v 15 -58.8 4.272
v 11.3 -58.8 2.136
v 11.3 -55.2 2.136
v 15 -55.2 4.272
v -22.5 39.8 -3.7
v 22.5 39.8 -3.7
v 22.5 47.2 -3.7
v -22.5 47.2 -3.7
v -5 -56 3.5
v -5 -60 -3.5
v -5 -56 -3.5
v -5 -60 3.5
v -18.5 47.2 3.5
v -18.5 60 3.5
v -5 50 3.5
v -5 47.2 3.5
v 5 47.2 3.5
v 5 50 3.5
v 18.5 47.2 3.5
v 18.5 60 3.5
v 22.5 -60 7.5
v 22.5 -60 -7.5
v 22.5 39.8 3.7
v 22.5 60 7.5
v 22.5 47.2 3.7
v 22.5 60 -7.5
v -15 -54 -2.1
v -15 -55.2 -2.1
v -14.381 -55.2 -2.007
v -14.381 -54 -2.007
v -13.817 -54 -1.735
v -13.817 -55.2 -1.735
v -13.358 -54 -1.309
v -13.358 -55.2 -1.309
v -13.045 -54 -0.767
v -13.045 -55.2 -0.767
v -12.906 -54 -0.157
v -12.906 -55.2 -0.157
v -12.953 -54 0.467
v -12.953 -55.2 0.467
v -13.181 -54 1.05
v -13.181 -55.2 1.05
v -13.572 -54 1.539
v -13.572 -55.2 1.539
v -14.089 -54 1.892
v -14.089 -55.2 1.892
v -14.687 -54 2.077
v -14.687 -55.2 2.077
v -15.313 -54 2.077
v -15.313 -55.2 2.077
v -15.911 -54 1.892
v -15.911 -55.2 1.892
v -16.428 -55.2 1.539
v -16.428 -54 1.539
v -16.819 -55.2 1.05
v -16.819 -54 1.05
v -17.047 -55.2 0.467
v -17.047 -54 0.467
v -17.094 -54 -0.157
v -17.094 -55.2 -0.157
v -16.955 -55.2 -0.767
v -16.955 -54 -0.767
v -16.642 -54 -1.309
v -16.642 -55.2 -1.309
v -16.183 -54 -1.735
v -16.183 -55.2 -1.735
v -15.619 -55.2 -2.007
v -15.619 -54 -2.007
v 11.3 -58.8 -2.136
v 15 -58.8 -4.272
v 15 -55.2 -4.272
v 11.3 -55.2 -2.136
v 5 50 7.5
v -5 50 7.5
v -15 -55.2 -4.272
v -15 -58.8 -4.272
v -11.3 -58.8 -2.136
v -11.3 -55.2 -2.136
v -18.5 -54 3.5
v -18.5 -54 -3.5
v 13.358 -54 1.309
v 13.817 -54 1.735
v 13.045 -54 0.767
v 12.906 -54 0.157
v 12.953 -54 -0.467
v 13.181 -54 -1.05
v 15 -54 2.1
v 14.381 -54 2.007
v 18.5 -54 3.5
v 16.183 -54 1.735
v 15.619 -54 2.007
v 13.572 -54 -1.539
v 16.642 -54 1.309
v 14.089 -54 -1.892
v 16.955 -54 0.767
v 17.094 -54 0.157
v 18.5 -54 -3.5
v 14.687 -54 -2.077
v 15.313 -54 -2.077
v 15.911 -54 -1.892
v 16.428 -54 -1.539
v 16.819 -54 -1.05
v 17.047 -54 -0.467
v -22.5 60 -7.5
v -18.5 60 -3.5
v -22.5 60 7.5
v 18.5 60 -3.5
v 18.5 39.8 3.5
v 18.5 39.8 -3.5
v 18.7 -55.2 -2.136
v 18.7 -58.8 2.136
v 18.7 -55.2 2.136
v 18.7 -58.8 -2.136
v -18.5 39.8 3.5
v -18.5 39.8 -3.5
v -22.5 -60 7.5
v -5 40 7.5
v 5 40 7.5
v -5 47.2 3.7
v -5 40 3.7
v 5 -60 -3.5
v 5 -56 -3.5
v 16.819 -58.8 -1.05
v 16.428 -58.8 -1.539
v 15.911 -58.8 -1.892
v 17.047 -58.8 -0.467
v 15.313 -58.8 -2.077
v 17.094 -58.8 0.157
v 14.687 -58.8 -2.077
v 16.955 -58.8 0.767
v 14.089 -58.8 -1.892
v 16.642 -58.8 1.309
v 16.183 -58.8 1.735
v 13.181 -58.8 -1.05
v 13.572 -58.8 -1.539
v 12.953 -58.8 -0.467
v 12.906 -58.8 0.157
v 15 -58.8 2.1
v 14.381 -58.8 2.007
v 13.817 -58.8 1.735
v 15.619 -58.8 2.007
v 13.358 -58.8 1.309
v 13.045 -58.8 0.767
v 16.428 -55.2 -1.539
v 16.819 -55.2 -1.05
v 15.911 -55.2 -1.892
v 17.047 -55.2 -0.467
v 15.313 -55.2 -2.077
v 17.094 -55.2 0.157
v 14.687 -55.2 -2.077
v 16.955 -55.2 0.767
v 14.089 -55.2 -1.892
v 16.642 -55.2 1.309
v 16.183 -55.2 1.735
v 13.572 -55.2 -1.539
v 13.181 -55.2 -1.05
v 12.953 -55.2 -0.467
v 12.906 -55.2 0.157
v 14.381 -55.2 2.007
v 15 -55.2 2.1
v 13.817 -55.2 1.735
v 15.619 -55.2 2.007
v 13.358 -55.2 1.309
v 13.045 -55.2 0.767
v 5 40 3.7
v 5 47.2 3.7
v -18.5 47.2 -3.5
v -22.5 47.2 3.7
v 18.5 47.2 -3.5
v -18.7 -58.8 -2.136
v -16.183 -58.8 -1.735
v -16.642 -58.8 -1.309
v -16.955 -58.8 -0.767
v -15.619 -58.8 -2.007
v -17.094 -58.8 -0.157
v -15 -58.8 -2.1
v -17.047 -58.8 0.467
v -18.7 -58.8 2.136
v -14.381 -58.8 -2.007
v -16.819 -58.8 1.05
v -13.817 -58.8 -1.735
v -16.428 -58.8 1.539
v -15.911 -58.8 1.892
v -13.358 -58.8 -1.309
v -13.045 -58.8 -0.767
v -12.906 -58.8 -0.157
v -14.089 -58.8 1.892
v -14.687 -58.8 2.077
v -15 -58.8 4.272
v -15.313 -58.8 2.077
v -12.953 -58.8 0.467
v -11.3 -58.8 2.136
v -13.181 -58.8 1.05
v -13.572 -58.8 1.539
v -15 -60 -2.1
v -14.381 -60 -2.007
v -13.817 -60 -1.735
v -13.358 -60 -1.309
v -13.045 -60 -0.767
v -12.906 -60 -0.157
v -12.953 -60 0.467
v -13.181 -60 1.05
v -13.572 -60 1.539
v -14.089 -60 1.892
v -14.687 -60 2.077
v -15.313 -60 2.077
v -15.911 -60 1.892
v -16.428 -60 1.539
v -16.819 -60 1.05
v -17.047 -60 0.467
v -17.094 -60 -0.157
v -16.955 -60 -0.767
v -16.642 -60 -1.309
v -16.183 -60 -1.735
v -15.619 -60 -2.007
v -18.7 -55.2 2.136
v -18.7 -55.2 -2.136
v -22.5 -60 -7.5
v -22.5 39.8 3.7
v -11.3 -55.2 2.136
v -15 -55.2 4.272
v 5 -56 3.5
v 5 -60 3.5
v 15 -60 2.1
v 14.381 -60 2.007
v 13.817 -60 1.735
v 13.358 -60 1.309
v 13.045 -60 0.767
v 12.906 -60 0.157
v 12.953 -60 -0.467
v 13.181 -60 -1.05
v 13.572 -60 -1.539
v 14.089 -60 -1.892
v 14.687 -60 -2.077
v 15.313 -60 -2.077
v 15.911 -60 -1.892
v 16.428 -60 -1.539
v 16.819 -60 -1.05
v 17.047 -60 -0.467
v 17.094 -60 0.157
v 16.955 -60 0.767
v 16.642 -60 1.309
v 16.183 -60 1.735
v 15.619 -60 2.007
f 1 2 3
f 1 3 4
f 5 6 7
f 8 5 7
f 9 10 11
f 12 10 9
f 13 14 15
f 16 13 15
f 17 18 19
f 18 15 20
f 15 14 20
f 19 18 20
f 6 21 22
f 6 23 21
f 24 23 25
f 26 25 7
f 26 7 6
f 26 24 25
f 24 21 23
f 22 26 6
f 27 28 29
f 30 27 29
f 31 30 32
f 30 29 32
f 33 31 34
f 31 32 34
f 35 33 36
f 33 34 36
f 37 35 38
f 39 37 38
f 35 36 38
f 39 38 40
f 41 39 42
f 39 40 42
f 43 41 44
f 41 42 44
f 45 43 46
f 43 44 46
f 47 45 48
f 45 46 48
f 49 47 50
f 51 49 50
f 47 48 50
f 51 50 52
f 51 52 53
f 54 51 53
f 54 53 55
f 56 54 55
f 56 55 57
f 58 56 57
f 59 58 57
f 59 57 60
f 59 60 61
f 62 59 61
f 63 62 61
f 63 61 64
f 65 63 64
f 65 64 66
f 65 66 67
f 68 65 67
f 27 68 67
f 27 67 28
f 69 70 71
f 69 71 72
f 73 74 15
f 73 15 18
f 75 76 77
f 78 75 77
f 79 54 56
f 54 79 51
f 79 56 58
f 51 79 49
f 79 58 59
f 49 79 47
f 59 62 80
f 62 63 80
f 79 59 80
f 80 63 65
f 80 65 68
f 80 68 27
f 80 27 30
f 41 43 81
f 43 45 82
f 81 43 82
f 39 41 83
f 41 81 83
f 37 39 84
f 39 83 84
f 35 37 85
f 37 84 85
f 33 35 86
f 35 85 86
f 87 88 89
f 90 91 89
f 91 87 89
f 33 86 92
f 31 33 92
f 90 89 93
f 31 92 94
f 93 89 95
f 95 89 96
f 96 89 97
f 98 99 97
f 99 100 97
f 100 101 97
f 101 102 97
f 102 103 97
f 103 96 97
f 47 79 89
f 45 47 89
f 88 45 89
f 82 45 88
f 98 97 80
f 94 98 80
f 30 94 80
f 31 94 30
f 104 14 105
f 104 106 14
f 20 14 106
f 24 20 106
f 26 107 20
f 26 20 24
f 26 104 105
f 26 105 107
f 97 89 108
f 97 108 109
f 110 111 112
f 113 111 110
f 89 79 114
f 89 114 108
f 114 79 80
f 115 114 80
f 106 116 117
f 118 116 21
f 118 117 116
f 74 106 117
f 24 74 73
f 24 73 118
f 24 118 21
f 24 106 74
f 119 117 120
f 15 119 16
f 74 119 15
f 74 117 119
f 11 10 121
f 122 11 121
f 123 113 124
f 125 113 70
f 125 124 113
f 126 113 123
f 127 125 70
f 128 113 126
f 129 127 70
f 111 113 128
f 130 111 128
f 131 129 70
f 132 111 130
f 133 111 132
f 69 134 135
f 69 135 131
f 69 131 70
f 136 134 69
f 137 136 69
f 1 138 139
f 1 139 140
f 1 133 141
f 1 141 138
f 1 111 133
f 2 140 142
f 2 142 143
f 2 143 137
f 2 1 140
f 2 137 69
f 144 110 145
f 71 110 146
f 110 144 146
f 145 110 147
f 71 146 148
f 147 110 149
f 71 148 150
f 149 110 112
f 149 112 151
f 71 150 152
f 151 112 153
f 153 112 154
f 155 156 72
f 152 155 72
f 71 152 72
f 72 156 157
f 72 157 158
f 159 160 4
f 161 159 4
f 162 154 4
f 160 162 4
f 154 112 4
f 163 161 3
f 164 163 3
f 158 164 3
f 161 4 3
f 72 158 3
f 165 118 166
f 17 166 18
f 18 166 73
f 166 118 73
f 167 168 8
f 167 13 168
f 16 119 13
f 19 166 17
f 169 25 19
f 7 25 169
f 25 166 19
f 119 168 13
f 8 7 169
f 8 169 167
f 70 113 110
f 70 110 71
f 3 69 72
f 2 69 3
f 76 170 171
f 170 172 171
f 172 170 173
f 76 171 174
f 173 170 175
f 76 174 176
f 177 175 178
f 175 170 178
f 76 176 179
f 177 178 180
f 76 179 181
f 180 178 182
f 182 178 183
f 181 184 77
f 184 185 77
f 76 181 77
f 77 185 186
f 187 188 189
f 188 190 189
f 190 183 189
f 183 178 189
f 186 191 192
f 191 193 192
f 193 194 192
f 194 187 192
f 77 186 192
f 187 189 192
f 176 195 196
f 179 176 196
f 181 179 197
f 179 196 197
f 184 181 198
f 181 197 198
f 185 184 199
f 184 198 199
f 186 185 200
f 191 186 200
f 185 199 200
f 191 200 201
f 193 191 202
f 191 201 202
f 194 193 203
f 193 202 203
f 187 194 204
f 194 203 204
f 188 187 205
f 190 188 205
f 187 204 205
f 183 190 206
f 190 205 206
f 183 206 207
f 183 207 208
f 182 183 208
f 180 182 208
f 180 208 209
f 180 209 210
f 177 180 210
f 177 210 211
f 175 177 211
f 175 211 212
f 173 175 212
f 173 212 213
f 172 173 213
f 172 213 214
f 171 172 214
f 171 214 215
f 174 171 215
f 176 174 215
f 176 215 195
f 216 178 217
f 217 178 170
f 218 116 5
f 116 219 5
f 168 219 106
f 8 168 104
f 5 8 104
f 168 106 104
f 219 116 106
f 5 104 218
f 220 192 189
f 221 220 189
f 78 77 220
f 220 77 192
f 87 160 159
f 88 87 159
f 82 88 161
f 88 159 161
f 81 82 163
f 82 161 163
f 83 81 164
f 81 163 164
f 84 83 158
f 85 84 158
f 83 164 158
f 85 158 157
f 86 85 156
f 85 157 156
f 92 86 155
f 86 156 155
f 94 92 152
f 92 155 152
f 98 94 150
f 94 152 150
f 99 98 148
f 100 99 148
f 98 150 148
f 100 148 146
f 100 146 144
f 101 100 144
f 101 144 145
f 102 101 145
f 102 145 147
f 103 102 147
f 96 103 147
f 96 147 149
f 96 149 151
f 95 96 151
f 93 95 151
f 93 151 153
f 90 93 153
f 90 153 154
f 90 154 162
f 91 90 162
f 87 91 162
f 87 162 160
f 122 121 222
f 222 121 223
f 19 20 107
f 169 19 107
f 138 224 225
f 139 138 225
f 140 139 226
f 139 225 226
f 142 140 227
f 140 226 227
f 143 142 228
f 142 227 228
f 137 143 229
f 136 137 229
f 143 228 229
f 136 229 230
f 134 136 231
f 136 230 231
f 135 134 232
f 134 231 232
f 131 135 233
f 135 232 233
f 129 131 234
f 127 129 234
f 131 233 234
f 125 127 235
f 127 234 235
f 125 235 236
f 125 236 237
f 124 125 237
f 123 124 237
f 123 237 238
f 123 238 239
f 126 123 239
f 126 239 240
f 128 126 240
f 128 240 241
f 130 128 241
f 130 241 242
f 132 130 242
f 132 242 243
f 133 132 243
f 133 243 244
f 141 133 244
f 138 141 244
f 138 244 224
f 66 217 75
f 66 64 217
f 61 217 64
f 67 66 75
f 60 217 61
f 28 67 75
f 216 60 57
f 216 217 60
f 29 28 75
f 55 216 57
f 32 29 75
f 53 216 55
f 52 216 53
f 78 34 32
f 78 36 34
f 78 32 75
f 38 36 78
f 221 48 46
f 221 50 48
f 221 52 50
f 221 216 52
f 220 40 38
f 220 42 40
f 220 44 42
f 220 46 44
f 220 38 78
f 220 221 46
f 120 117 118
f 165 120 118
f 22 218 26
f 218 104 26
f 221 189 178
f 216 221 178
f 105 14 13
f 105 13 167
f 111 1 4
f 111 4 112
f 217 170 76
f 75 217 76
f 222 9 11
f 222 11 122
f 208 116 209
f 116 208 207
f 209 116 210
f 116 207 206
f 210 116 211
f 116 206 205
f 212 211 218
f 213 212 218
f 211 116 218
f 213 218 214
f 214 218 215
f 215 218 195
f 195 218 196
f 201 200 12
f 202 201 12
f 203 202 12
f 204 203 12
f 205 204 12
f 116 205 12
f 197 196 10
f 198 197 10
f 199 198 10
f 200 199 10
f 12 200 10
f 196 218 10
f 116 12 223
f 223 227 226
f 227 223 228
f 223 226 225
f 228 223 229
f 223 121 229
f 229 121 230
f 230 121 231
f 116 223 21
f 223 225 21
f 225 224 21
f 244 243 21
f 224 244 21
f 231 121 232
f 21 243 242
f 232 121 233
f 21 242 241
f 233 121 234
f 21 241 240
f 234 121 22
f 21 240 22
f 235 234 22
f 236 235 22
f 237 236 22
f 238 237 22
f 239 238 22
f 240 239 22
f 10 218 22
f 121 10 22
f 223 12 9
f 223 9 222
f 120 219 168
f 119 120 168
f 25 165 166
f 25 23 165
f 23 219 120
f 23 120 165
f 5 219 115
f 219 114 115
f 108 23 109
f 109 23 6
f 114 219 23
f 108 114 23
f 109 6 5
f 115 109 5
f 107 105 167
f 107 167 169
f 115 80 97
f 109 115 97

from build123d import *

# Parameters (mm, degrees)
SKETCH1_W                 = 45
SKETCH1_H                 = 15
BOSS_EXTRUDE1_DEPTH       = 60
SHELL1_T                  = -4
SHELL1_THICKNESS_2_FACE_W = 7
SHELL1_THICKNESS_2_FACE_H = 37
SHELL1_THICKNESS_2_DEPTH  = 2
SKETCH3_W                 = 10
SKETCH3_H                 = 7
CUT_EXTRUDE2_DEPTH        = 4
CUT_EXTRUDE3_REACH        = 67.812
SKETCH4_W                 = 10
SKETCH4_H                 = 10
SKETCH5_W                 = 7.4
SKETCH5_H                 = 7.4
CUT_EXTRUDE4_DEPTH        = 76.374067158
CUT_EXTRUDE5_START        = -1.2
CUT_EXTRUDE5_DEPTH        = 3.6
SKETCH7_R                 = 2.1
CUT_EXTRUDE6_DEPTH        = 123.321298227


with BuildPart() as part:
    # Sketch1 → Boss-Extrude1 (new, symmetric)
    with BuildSketch(Plane(origin=(0, 0, 0), x_dir=(1, 0, 0), z_dir=(0, 1, 0))):
        Rectangle(SKETCH1_W, SKETCH1_H)
    extrude(amount=BOSS_EXTRUDE1_DEPTH, both=True)

    # Shell1
    shell1_openings = [part.faces().sort_by_distance(p)[0] for p in [
        (0, 60, 0),
    ]]
    offset(amount=SHELL1_T, openings=shell1_openings, kind=Kind.INTERSECTION)

    # Shell1 thickness 2 face (on inner face of the shell) → Shell1 thickness 2 (add)
    with BuildSketch(Plane(origin=(0, -56, 0), x_dir=(0, 0, -1), z_dir=(0, -1, 0))):
        Rectangle(SHELL1_THICKNESS_2_FACE_W, SHELL1_THICKNESS_2_FACE_H)
    extrude(amount=-SHELL1_THICKNESS_2_DEPTH)

    # Sketch3 → Cut-Extrude2 (cut)
    with BuildSketch(Plane.XZ.offset(60)):
        Rectangle(SKETCH3_W, SKETCH3_H)
    extrude(amount=-CUT_EXTRUDE2_DEPTH, mode=Mode.SUBTRACT)

    # Sketch4 → Cut-Extrude3 (cut, up to next)
    with BuildSketch(Plane.XY.offset(7.5), mode=Mode.PRIVATE) as cut_extrude3_sk1:
        with Locations((0, 45)):
            Rectangle(SKETCH4_W, SKETCH4_H)
    cut_extrude3_tool1 = extrude(cut_extrude3_sk1.sketch, amount=-CUT_EXTRUDE3_REACH, mode=Mode.PRIVATE) & part.part
    add(cut_extrude3_tool1.solids().sort_by_distance((0, 45, 7.5))[0], mode=Mode.SUBTRACT)

    # Sketch5 → Cut-Extrude4 (cut, through all)
    with BuildSketch(Plane(origin=(22.5, 0, 0), x_dir=(0, 0, -1), z_dir=(1, 0, 0))):
        with Locations((0, 43.5)):
            Rectangle(SKETCH5_W, SKETCH5_H)
    extrude(amount=-CUT_EXTRUDE4_DEPTH, mode=Mode.SUBTRACT)

    # Sketch6 → Cut-Extrude5 (cut)
    with BuildSketch(Plane.XZ.offset(60).offset(CUT_EXTRUDE5_START)):
        Polygon((-15, 4.272391992), (-18.7, 2.136195996), (-18.7, -2.136195996), (-15, -4.272391992), (-11.3, -2.136195996), (-11.3, 2.136195996), align=None)
        Polygon((11.3, 2.136195996), (15, 4.272391992), (18.7, 2.136195996), (18.7, -2.136195996), (15, -4.272391992), (11.3, -2.136195996), align=None)
    extrude(amount=-CUT_EXTRUDE5_DEPTH, mode=Mode.SUBTRACT)

    # Sketch7 → Cut-Extrude6 (cut, through all)
    with BuildSketch(Plane.XZ.offset(60)):
        with Locations(Location((-15, 0, 0), (0, 0, 270))):
            Circle(SKETCH7_R)
        with Locations(Location((15, 0, 0), (0, 0, 90))):
            Circle(SKETCH7_R)
    extrude(amount=-CUT_EXTRUDE6_DEPTH, mode=Mode.SUBTRACT)


solid = part.part
